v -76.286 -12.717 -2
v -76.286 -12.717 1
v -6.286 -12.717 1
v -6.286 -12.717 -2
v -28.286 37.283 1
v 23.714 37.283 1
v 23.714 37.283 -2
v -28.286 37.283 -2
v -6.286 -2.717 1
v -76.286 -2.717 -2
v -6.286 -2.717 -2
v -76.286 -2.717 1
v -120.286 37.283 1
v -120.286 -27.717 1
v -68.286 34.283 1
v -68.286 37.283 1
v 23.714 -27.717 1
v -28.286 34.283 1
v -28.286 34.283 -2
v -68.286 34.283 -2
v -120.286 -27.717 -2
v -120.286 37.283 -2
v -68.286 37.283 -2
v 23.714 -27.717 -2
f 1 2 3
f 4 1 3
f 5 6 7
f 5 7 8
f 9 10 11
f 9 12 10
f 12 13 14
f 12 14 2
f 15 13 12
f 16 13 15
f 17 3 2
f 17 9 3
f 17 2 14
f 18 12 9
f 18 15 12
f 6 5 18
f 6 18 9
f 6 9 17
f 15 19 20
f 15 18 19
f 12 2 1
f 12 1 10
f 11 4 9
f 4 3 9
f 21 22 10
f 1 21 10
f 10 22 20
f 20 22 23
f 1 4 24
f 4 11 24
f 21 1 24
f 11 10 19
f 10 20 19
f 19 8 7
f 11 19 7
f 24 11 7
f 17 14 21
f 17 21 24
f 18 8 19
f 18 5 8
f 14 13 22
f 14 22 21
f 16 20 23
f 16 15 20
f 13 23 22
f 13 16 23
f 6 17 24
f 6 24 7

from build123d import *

# Parameters (mm, degrees)
ESBO_O1_W                     = 70
ESBO_O1_H                     = 10
RESSALTO_EXTRUS_O1_DEPTH      = 1
RESSALTO_EXTRUS_O1_DEPTH_BACK = 2


with BuildPart() as part:
    # Esboço1 → Ressalto-extrusão1 (new body, two sides)
    with BuildSketch(Plane.XY) as ressalto_extrus_o1_sk:
        Polygon((-68.286430173, 37.282901017), (-120.286430173, 37.282901017), (-120.286430173, -27.717098983), (23.713569827, -27.717098983), (23.713569827, 37.282901017), (-28.286430173, 37.282901017), (-28.286430173, 34.282901017), (-68.286430173, 34.282901017), align=None)
        with Locations((-41.286430173, -7.717098983)):
            Rectangle(ESBO_O1_W, ESBO_O1_H, mode=Mode.SUBTRACT)
    extrude(amount=RESSALTO_EXTRUS_O1_DEPTH)
    extrude(ressalto_extrus_o1_sk.sketch, amount=-RESSALTO_EXTRUS_O1_DEPTH_BACK)


solid = part.part
